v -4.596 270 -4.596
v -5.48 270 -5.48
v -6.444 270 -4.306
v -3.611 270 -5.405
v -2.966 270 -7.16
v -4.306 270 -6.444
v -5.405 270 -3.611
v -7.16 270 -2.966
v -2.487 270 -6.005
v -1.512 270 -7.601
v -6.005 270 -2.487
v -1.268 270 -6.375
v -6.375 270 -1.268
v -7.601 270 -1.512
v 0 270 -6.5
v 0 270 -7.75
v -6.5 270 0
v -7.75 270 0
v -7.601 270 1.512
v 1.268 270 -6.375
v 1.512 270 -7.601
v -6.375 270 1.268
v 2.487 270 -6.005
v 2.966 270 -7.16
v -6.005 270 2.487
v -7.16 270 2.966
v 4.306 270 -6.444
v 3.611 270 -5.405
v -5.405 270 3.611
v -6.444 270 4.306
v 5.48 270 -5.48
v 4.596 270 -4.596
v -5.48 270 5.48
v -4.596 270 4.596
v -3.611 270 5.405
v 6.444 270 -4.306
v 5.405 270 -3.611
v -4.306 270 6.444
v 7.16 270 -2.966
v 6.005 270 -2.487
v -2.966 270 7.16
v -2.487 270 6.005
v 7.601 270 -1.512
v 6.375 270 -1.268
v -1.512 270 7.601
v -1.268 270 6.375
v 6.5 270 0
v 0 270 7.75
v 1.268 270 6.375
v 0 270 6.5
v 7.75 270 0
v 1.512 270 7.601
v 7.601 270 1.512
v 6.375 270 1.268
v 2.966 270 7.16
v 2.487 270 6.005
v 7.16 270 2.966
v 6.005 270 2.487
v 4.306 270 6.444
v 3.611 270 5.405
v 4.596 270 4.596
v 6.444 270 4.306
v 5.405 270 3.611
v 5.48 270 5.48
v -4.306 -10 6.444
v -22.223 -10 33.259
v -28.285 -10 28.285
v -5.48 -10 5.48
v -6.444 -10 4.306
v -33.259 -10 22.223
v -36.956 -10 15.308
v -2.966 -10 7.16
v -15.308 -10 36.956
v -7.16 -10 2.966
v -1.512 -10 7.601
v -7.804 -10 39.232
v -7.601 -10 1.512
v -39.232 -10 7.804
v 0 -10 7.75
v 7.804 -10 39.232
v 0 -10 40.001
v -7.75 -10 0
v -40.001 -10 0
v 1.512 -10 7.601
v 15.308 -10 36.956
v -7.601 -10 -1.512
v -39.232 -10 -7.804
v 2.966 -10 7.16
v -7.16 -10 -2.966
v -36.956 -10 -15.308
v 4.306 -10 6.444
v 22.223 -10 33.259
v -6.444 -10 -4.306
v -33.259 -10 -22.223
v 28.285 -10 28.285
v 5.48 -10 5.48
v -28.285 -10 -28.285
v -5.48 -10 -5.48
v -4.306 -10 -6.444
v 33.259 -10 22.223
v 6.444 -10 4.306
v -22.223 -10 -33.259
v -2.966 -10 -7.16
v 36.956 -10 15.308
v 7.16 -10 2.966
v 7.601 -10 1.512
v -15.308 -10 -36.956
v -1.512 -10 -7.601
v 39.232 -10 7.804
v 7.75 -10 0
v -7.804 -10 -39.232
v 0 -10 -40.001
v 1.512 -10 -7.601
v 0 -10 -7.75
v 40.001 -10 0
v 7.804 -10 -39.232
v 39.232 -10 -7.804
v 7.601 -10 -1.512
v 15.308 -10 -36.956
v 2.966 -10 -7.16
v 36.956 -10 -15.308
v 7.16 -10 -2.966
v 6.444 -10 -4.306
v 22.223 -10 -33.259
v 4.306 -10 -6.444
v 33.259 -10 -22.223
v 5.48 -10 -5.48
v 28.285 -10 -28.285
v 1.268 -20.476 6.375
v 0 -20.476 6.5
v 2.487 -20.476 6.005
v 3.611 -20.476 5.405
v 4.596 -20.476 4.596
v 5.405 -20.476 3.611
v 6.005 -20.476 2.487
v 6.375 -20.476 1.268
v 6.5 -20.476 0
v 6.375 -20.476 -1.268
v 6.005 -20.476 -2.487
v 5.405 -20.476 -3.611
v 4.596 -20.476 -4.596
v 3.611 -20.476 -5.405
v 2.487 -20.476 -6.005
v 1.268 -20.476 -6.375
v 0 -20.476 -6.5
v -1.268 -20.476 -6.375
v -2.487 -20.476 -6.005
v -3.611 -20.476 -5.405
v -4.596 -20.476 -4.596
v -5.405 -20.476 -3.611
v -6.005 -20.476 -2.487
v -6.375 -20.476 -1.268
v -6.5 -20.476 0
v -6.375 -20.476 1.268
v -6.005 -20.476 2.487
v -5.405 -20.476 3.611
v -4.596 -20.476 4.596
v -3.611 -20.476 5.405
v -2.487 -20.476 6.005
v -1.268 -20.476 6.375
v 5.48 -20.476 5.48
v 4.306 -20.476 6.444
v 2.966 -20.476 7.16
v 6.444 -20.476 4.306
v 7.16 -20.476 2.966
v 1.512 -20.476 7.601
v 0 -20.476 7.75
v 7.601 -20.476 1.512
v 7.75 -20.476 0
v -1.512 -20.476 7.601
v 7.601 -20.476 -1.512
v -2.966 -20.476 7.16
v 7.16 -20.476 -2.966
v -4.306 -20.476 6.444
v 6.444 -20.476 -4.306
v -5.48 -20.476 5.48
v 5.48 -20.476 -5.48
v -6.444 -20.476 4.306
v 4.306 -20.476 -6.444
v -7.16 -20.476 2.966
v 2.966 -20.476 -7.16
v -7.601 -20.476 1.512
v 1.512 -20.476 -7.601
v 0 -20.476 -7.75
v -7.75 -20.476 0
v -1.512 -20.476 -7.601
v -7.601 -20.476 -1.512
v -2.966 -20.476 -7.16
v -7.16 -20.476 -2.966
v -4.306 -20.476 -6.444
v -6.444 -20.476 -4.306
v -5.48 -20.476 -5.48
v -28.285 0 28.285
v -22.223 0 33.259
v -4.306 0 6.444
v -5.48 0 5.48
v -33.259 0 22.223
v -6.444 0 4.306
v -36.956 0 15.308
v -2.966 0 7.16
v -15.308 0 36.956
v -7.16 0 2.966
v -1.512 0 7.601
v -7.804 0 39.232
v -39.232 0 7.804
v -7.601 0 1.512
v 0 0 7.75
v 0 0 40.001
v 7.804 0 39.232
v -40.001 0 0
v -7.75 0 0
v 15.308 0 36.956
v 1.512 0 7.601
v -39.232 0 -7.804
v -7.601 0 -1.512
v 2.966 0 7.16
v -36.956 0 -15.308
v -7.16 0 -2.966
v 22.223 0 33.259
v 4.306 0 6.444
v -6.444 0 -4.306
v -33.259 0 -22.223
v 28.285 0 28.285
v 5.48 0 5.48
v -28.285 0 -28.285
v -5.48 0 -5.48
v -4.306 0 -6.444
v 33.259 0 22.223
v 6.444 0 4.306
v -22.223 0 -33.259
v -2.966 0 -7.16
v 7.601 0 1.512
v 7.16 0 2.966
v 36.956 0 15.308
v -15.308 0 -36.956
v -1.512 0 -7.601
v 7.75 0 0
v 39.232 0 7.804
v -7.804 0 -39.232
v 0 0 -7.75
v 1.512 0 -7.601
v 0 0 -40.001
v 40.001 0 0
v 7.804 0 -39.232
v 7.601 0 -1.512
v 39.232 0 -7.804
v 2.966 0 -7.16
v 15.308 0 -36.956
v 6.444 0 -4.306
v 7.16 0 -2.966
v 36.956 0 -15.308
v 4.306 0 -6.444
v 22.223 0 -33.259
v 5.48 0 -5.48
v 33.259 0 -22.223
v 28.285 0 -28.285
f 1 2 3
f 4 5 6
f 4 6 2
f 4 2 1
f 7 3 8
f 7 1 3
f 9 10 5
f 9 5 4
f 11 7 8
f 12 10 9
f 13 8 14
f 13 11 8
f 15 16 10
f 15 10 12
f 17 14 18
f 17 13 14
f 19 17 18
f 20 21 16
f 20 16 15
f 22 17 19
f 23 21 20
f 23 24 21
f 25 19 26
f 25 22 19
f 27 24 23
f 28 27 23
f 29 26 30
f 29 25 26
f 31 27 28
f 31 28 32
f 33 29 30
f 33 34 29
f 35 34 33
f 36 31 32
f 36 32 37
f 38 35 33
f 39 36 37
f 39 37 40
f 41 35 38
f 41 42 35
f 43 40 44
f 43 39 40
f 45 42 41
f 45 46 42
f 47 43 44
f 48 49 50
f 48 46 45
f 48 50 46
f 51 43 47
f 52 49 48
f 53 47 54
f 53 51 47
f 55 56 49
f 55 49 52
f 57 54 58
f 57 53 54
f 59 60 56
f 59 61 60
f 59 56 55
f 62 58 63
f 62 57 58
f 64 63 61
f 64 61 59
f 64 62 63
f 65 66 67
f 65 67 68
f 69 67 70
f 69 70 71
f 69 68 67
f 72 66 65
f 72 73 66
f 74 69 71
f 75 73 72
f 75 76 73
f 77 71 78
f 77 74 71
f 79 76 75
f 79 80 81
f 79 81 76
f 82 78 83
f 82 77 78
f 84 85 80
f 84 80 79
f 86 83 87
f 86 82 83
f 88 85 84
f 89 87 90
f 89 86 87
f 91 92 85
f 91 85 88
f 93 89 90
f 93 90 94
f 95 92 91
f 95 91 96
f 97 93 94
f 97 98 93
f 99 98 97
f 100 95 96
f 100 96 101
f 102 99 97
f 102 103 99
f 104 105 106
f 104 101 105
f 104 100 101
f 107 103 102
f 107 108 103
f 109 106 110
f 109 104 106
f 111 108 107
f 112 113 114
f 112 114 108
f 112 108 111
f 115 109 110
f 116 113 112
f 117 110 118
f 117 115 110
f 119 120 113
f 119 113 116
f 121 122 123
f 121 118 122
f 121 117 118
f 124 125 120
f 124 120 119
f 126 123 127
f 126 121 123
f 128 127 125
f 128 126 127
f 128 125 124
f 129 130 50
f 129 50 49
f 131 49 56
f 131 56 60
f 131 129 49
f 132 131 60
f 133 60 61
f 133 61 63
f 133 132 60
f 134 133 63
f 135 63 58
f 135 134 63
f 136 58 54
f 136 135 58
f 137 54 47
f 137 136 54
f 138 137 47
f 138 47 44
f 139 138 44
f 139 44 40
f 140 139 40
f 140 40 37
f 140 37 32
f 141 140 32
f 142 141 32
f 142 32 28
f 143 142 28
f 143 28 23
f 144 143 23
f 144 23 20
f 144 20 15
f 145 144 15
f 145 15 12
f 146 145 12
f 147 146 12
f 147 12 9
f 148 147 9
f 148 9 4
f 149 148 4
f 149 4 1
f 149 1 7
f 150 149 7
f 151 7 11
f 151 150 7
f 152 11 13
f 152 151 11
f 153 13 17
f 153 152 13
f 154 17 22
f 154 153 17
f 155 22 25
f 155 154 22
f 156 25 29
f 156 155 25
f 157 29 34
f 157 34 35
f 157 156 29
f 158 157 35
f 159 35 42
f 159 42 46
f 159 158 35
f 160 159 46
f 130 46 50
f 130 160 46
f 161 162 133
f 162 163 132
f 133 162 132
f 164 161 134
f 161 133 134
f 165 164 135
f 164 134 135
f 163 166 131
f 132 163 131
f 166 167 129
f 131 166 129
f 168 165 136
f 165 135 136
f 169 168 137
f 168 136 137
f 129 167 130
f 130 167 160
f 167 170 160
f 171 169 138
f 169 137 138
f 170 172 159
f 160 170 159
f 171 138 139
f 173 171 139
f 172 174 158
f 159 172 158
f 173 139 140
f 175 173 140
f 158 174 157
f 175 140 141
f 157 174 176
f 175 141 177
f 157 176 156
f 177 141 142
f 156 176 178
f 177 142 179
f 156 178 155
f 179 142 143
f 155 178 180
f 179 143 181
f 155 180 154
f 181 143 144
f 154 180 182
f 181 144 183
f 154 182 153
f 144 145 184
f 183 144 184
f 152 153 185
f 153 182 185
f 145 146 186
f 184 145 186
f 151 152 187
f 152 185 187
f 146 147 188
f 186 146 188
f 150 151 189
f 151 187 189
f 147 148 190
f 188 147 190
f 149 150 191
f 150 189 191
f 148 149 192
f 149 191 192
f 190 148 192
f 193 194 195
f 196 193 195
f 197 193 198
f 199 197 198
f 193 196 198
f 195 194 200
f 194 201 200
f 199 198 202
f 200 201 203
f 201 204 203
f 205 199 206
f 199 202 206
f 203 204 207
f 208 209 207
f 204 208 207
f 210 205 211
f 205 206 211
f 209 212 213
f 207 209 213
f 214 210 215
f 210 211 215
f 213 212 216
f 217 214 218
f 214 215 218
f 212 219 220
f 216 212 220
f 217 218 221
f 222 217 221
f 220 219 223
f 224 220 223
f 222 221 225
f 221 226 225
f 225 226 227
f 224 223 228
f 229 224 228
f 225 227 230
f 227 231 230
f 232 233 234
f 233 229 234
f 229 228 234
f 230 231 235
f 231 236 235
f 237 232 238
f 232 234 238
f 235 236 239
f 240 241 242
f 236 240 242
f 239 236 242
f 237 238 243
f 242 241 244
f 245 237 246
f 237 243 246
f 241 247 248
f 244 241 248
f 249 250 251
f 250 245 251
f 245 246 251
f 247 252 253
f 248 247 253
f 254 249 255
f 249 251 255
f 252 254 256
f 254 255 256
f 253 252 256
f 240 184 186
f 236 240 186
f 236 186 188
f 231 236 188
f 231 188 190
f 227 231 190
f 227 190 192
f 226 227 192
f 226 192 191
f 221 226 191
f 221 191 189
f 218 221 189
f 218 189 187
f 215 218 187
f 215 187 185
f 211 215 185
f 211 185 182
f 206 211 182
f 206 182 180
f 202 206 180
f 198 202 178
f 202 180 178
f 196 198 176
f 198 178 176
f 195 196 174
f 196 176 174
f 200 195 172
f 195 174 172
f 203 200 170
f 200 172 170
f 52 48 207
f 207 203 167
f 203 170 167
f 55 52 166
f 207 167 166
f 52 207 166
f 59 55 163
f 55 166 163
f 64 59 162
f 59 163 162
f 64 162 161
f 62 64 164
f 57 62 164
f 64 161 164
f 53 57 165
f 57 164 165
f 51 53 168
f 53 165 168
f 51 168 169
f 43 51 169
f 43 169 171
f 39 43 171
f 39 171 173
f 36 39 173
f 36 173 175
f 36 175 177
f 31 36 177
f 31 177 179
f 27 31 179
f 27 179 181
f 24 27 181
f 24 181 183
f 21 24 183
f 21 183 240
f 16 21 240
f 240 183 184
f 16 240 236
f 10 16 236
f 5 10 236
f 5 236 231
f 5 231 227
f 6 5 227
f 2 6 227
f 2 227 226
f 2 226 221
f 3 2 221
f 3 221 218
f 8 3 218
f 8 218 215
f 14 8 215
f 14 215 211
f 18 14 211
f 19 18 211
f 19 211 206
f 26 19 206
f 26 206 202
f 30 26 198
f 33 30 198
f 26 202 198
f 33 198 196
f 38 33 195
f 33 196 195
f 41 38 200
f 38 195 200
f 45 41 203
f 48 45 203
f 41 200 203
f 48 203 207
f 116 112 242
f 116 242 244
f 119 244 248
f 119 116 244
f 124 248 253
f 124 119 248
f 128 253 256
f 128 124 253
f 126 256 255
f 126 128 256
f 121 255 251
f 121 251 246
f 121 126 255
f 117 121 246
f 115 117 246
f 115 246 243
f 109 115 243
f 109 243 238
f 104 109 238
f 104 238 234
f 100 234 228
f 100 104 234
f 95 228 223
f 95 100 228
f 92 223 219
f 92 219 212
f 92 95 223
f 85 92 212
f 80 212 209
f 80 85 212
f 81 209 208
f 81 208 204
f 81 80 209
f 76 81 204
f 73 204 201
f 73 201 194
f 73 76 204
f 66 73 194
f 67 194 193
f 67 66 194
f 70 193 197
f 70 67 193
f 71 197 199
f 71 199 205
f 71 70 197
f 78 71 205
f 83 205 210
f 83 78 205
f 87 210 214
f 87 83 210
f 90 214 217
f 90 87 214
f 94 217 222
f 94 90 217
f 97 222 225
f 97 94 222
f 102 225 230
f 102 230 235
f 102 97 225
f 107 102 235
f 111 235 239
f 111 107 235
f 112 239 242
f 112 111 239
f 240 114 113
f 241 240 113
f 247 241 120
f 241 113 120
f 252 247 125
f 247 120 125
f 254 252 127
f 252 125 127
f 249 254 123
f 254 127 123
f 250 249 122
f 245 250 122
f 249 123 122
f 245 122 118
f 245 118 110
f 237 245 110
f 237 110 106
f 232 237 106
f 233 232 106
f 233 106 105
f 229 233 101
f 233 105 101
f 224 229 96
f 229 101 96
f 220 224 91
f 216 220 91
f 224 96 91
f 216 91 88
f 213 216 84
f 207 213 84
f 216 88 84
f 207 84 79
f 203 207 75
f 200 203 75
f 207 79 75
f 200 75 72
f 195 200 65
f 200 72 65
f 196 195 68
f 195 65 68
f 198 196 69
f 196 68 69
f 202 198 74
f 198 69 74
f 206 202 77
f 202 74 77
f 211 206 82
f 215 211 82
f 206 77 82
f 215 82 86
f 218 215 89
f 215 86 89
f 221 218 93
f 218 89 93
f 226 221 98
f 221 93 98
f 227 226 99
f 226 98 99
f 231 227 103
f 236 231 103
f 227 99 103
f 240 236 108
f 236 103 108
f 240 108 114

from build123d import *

# Parameters (mm, degrees)
SKETCH1_R           = 7.75
SKETCH1_R_2         = 6.5
BOSS_EXTRUDE1_DEPTH = 270
BOSS_EXTRUDE2_START = 10
SKETCH2_R           = 40.000518223
SKETCH2_R_2         = 7.75
BOSS_EXTRUDE2_DEPTH = 10
BOSS_EXTRUDE3_START = -20.476429663
SKETCH1_2_R         = 7.75
SKETCH1_2_R_2       = 6.5
BOSS_EXTRUDE3_DEPTH = 20.476429663


with BuildPart() as part:
    # Sketch1 → Boss-Extrude1 (new body)
    with BuildSketch(Plane(origin=(0, 0, 0), x_dir=(1, 0, 0), z_dir=(0, 1, 0))):
        Circle(SKETCH1_R)
        Circle(SKETCH1_R_2, mode=Mode.SUBTRACT)
    extrude(amount=BOSS_EXTRUDE1_DEPTH)

    # Sketch1<2> → Boss-Extrude3 (add)
    with BuildSketch(Plane(origin=(0, 0, 0), x_dir=(1, 0, 0), z_dir=(0, 1, 0)).offset(BOSS_EXTRUDE3_START)):
        Circle(SKETCH1_2_R)
        Circle(SKETCH1_2_R_2, mode=Mode.SUBTRACT)
    extrude(amount=BOSS_EXTRUDE3_DEPTH)


with BuildPart() as body_2:
    # Sketch2 → Boss-Extrude2 (new body)
    with BuildSketch(Plane(origin=(0, 0, 0), x_dir=(-1, 0, 0), z_dir=(0, -1, 0)).offset(BOSS_EXTRUDE2_START)):
        Circle(SKETCH2_R)
        Circle(SKETCH2_R_2, mode=Mode.SUBTRACT)
    extrude(amount=-BOSS_EXTRUDE2_DEPTH)


solid = Compound([part.part, body_2.part])
